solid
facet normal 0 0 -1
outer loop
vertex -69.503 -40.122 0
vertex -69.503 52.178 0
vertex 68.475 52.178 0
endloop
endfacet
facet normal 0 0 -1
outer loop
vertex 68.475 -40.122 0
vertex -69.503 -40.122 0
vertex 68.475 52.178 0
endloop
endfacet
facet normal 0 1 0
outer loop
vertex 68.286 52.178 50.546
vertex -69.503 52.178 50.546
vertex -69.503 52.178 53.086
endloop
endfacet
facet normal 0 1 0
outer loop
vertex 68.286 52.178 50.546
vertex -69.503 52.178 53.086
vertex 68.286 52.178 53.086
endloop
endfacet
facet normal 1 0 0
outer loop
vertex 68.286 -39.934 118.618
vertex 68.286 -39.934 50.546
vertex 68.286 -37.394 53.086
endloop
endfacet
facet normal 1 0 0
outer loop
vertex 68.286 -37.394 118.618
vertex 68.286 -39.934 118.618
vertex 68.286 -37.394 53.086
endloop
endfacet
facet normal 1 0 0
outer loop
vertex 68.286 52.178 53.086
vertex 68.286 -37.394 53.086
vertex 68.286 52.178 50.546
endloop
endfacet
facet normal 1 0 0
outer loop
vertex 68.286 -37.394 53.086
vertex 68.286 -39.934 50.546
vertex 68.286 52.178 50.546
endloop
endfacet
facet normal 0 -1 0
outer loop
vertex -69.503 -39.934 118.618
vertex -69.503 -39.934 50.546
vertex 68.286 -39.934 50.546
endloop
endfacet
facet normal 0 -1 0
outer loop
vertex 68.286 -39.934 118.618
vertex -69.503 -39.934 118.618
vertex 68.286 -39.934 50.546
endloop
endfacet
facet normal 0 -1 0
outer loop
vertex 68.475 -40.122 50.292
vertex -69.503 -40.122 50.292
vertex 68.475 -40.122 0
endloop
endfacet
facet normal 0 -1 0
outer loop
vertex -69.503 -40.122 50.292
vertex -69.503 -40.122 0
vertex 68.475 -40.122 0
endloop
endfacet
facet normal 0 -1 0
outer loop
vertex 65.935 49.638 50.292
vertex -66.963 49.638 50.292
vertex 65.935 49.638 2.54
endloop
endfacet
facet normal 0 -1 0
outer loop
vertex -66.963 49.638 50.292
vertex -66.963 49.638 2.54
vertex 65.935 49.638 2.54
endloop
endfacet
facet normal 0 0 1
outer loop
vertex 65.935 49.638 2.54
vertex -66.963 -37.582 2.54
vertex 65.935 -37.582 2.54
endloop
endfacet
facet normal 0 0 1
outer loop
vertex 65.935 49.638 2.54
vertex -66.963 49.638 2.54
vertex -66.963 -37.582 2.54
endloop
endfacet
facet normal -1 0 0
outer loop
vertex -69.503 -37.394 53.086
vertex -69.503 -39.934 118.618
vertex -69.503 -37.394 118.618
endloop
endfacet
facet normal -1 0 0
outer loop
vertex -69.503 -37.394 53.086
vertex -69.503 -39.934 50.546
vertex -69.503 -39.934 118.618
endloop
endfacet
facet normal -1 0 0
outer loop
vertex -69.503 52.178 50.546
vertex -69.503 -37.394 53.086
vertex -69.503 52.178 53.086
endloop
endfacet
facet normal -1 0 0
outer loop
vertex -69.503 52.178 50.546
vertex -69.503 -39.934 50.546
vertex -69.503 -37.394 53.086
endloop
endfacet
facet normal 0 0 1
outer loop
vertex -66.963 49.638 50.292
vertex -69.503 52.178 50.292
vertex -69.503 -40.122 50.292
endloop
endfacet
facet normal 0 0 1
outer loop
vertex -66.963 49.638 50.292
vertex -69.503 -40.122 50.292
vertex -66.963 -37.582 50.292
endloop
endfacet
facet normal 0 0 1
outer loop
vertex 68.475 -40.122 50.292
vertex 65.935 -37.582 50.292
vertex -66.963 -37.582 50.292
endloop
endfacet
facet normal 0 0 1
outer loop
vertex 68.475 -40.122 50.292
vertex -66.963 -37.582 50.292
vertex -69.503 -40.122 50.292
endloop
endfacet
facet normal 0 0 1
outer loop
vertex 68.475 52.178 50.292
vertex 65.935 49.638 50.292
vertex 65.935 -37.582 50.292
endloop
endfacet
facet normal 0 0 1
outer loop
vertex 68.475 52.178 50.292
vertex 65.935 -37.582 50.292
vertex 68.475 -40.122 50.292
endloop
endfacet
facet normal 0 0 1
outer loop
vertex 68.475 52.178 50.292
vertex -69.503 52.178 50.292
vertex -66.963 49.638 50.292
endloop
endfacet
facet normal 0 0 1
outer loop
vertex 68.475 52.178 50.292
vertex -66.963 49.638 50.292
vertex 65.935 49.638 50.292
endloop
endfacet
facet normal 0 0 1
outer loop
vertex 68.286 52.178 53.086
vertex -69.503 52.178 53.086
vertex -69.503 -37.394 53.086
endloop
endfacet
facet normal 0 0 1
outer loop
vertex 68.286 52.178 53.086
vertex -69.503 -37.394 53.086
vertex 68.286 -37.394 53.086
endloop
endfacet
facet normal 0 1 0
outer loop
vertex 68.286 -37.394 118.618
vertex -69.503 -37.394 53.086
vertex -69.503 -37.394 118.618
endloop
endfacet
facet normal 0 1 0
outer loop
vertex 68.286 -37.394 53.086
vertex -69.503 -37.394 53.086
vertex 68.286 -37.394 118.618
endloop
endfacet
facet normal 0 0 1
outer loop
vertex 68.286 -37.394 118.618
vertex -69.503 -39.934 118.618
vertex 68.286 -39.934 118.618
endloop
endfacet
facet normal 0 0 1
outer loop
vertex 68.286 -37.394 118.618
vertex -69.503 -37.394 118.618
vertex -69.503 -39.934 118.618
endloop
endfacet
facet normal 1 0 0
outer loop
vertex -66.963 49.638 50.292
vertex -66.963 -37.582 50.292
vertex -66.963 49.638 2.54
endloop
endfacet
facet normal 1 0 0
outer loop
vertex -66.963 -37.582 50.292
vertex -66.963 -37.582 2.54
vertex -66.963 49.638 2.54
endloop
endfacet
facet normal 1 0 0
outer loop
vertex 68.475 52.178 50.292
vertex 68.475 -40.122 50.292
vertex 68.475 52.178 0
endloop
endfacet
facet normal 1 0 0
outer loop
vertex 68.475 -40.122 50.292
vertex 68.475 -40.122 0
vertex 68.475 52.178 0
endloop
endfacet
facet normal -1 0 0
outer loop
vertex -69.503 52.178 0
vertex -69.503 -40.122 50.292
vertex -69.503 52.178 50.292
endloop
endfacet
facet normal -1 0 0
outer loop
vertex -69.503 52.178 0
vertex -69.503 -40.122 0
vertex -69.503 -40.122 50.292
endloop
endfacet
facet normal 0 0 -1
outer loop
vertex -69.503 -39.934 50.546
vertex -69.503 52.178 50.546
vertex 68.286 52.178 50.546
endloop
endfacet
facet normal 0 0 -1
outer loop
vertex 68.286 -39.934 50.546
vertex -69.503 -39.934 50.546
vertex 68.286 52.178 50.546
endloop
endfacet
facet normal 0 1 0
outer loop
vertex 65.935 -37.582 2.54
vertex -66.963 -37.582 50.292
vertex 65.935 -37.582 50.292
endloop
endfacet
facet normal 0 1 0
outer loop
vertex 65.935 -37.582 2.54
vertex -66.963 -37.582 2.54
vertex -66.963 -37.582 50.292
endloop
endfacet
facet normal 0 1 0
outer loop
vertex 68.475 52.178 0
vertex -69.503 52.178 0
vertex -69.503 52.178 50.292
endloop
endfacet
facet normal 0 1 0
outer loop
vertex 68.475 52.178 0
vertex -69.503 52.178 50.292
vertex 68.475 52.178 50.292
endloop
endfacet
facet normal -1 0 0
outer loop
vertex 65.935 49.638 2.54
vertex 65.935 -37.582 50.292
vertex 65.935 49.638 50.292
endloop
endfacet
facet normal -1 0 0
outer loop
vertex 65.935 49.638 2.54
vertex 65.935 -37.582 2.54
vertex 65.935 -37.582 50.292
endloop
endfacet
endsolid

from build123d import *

# Parameters (mm, degrees)
F0_W     = 137.9779204726
F0_H     = 92.2998674214
F1_DEPTH = 3.302
F2_DEPTH = 46.99
F3_T     = -2.54
F5_W     = 137.7891749144
F5_H     = 92.1111144125
F6_DEPTH = 68.072
F7_T     = -2.54


with BuildPart() as f1:
    # F0 (on Top) → F1 (new body)
    with BuildSketch(Plane.XY):
        with Locations((-0.5138330162, 6.0276221484)):
            Rectangle(F0_W, F0_H)
    extrude(amount=F1_DEPTH)

    # F2 (add): a face of the model
    f2_faces = [f1.faces().sort_by_distance(p)[0] for p in [
        (-0.5138330162, 6.0276221484, 3.302),
    ]]
    extrude(f2_faces, amount=F2_DEPTH)

    # F3
    f3_openings = [f1.faces().sort_by_distance(p)[0] for p in [
        (-0.513833, 6.027622, 50.292),
    ]]
    offset(amount=F3_T, openings=f3_openings)


with BuildPart() as f6:
    # F5 (on offset) → F6 (new body)
    with BuildSketch(Plane.XY.offset(50.546)):
        with Locations((-0.6082057953, 6.1219986528)):
            Rectangle(F5_W, F5_H)
    extrude(amount=F6_DEPTH)

    # F7
    f7_openings = [f6.faces().sort_by_distance(p)[0] for p in [
        (-69.502793, 6.121999, 84.582),
        (-0.608206, 6.121999, 118.618),
        (68.286382, 6.121999, 84.582),
        (-0.608206, 52.177556, 84.582),
    ]]
    offset(amount=F7_T, openings=f7_openings)


solid = Compound([f1.part, f6.part])
